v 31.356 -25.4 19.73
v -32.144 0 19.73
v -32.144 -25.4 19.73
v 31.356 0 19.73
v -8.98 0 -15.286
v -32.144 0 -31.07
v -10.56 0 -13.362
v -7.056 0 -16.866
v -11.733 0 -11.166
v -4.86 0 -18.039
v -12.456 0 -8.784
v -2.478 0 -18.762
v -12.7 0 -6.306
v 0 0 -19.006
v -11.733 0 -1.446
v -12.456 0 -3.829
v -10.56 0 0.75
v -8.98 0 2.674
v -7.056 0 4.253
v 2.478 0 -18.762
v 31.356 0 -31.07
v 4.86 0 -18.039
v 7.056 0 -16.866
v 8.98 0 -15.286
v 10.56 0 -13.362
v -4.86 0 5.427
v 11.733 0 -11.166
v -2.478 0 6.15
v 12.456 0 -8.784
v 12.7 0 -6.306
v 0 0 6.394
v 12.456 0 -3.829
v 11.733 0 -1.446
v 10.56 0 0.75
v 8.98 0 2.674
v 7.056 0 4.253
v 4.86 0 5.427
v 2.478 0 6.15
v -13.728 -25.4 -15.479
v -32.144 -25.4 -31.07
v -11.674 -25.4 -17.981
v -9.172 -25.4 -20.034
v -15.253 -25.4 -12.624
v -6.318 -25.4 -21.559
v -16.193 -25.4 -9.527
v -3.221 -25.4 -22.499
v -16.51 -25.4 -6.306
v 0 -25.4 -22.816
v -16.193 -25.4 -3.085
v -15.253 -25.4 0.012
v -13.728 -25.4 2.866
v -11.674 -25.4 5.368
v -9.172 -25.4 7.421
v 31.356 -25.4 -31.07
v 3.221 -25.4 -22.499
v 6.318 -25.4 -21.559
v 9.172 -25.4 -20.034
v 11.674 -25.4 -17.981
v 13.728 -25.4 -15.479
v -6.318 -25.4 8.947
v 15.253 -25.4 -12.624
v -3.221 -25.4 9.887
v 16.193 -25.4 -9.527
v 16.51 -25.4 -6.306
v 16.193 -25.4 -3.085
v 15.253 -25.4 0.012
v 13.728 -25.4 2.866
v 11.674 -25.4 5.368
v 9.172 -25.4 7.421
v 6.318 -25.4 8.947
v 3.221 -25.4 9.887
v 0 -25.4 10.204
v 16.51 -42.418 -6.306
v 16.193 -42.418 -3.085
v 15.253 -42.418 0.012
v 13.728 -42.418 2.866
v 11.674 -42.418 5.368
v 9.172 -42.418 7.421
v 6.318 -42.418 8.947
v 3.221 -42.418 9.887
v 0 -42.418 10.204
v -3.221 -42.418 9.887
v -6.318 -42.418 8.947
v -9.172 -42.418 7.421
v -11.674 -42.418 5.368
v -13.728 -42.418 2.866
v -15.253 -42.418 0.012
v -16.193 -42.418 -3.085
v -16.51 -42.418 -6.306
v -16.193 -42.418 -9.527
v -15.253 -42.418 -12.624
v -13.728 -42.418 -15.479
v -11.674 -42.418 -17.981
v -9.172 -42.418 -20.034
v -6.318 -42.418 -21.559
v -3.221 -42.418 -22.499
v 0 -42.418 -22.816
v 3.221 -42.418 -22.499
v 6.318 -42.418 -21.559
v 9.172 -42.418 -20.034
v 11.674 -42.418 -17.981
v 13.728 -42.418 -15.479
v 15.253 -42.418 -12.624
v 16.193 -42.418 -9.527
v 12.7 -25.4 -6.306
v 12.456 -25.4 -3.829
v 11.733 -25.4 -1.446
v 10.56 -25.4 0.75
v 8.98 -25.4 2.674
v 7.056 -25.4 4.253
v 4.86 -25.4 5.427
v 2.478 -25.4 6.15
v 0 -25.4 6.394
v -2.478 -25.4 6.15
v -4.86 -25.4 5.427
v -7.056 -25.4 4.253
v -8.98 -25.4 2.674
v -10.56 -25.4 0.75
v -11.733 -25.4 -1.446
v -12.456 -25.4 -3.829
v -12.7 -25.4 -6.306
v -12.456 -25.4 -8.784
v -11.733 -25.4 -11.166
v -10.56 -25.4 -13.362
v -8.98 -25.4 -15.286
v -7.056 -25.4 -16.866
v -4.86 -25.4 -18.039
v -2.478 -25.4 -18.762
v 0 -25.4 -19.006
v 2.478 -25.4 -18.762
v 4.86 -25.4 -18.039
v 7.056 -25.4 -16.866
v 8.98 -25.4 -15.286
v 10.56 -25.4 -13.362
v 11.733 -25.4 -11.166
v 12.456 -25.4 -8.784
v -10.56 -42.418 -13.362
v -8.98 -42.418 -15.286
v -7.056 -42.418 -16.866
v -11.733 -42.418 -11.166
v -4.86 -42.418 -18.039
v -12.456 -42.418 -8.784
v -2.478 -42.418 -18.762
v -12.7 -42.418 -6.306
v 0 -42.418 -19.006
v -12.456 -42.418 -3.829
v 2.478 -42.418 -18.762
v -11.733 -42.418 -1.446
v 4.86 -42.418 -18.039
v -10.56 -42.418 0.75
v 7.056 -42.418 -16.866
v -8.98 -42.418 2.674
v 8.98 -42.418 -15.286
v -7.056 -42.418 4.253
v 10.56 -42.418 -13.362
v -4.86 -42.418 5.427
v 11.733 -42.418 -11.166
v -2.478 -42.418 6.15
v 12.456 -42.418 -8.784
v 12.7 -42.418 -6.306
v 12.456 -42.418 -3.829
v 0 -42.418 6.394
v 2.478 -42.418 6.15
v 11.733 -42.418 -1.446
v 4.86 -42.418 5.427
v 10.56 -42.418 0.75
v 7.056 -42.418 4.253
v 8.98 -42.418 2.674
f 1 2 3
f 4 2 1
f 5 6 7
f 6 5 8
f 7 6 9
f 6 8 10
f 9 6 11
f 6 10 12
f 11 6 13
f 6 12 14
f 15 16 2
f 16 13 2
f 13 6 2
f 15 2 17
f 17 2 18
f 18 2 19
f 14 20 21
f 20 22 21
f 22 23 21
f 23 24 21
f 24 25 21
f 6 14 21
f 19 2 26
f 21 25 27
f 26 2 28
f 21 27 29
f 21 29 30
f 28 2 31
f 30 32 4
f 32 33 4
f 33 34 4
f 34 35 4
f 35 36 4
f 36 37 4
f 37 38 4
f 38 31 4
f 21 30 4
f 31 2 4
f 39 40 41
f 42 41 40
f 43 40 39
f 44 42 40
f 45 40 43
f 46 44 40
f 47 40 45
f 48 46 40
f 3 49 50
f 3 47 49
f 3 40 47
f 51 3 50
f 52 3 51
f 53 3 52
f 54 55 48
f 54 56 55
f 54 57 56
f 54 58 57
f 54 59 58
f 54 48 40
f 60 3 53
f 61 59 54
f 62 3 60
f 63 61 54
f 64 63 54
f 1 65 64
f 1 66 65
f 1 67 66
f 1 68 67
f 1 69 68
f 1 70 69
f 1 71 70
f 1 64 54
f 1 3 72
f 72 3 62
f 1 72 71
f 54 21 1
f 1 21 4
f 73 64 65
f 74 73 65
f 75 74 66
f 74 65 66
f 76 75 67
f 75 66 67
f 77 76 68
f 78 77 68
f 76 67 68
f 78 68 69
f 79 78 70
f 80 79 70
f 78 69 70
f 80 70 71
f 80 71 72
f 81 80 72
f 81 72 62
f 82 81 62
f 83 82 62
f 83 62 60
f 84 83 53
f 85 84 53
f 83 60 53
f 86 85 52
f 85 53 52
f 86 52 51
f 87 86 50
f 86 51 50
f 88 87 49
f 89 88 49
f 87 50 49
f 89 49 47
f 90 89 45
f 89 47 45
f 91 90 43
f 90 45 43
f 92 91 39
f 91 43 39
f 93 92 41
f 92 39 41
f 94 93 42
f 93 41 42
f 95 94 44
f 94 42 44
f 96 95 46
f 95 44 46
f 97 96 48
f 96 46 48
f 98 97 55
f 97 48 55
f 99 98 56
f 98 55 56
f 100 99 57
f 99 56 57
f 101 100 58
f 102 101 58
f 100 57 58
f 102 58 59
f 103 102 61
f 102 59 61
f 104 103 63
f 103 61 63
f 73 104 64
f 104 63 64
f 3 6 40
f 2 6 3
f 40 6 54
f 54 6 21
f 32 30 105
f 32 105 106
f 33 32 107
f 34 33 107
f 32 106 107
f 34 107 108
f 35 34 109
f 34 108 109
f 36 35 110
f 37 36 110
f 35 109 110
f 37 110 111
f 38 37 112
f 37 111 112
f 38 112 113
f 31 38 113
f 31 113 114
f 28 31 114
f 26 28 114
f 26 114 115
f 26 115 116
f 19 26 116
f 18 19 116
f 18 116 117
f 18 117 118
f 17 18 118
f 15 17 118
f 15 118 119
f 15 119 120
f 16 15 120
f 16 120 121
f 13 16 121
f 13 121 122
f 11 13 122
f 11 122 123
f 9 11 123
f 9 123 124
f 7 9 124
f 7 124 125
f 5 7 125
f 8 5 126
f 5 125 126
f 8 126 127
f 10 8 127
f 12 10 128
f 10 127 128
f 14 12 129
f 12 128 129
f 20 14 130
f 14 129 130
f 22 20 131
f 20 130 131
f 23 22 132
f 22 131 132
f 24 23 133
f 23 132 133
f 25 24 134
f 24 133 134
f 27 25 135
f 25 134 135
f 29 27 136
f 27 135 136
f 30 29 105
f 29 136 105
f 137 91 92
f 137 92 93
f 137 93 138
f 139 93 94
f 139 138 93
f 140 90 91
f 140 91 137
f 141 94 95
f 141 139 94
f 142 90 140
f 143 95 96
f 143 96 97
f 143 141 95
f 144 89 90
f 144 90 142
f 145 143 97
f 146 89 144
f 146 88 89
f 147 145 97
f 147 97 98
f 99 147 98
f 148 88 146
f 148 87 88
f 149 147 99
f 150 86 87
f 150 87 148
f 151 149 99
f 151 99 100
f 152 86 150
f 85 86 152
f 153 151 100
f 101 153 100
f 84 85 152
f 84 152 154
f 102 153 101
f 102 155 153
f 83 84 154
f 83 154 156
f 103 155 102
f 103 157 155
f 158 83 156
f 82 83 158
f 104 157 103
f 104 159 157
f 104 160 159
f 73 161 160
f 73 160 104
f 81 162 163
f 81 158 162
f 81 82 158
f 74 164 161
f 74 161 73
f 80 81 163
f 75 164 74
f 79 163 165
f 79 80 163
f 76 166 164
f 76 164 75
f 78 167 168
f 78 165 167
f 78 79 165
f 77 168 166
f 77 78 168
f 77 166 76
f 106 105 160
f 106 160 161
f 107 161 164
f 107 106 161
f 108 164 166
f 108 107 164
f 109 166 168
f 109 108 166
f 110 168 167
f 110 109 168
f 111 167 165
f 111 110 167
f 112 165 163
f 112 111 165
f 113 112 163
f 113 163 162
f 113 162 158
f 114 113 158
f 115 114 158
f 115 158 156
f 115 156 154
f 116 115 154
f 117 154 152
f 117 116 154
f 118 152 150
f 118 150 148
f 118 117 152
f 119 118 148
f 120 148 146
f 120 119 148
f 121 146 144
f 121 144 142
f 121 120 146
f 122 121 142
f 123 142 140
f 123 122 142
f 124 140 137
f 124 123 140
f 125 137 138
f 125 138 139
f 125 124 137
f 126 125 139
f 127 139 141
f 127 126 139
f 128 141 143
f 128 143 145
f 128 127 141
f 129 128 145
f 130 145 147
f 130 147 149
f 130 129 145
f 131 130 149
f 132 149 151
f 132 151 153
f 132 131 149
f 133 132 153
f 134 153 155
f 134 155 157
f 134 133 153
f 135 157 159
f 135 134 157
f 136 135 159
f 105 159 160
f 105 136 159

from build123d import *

# Parameters (mm, degrees)
F0_W     = 63.5
F0_H     = 50.8
F1_DEPTH = 25.4
F2_R     = 12.7
F3_DEPTH = 25.401
F4_R     = 16.51
F4_R_2   = 12.7
F5_DEPTH = 17.018


with BuildPart() as f1:
    # F0 (on Front) → F1 (new body)
    with BuildSketch(Plane.XZ):
        with Locations((-0.3941375762, -5.669991883)):
            Rectangle(F0_W, F0_H)
    extrude(amount=F1_DEPTH)

    # F2 (on face) → F3 (cut, through all)
    with BuildSketch(Plane.XZ.offset(25.4)):
        with Locations((0, -6.3062068075)):
            Circle(F2_R)
    extrude(amount=-F3_DEPTH, mode=Mode.SUBTRACT)

    # F4 (on face) → F5 (join)
    with BuildSketch(Plane.XZ.offset(25.4)):
        with Locations((0, -6.3062068075)):
            Circle(F4_R)
        with Locations((0, -6.3062068075)):
            Circle(F4_R_2, mode=Mode.SUBTRACT)
    extrude(amount=F5_DEPTH)


solid = f1.part
